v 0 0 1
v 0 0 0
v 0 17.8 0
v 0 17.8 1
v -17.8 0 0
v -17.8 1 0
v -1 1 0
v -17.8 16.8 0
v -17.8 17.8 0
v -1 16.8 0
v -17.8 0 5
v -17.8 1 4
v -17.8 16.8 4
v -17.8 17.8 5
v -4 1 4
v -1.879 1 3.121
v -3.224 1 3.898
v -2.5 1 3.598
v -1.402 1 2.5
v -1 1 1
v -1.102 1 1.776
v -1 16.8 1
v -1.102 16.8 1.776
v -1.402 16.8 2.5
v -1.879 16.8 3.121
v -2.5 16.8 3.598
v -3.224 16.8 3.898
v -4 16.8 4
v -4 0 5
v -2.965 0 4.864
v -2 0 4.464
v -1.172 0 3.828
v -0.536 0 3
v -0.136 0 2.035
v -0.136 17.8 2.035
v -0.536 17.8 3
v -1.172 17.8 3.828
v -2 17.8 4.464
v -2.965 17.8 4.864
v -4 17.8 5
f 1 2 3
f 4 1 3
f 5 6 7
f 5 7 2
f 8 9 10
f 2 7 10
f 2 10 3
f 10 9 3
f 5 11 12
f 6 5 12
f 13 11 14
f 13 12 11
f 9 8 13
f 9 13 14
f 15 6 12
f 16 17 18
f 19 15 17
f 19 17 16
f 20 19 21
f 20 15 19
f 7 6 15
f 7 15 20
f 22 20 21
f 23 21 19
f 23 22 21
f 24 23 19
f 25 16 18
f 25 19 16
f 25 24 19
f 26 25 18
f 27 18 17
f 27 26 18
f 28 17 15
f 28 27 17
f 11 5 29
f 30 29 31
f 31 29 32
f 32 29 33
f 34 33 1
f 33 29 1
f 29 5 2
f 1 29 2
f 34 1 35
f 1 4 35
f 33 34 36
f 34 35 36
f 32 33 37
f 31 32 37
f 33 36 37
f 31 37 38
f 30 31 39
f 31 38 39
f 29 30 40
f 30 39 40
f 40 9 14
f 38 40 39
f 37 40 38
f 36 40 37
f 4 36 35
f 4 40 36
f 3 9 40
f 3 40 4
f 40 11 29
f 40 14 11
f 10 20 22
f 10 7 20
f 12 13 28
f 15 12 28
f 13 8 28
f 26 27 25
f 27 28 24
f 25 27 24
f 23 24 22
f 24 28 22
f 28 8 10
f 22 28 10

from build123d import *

# Parameters (mm, degrees)
F0_W     = 17.8
F0_H     = 17.8
F1_DEPTH = 5
F2_R     = 4
F3_T     = -1


with BuildPart() as f1:
    # F0 (on Top) → F1 (new body)
    with BuildSketch(Plane.XY):
        with Locations((-8.9, 8.9)):
            Rectangle(F0_W, F0_H)
    extrude(amount=F1_DEPTH)

    # F2
    f2_edges = [f1.edges().sort_by_distance(p)[0] for p in [
        (0, 8.9, 5),
    ]]
    fillet(f2_edges, radius=F2_R)

    # F3
    f3_openings = [f1.faces().sort_by_distance(p)[0] for p in [
        (-8.9, 8.9, 0),
        (-17.8, 8.9, 2.5),
    ]]
    offset(amount=F3_T, openings=f3_openings)


solid = f1.part
